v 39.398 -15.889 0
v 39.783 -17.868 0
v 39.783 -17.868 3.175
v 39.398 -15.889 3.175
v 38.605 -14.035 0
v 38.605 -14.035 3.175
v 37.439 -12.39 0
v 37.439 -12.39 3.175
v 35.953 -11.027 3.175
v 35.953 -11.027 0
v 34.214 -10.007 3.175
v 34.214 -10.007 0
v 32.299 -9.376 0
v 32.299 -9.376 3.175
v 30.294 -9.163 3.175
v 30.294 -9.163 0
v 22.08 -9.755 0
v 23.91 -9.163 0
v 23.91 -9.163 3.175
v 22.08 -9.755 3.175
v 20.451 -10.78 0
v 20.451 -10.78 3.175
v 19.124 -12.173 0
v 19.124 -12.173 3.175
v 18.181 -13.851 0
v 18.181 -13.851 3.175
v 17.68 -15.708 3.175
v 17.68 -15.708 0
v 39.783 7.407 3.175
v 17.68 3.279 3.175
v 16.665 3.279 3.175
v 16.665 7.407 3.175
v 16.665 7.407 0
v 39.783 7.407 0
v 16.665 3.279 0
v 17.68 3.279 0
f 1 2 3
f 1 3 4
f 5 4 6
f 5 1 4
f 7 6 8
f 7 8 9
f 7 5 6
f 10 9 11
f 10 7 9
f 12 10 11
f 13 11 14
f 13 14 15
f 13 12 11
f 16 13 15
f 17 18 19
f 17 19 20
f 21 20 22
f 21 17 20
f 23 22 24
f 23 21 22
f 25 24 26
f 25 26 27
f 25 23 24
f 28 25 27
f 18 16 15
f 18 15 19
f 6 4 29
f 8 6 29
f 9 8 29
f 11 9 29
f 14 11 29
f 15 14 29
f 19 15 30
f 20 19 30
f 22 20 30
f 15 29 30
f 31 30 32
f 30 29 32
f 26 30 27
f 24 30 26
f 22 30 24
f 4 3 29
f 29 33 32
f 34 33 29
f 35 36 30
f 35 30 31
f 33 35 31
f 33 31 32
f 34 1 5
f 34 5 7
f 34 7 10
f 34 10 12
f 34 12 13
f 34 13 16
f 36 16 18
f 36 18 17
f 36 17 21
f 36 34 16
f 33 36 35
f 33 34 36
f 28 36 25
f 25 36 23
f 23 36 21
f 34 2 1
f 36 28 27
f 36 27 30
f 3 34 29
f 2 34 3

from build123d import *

# Parameters (mm, degrees)
BOSS_EXTRUDE3_DEPTH = 3.175


with BuildPart() as part:
    # Sketch3 → Boss-Extrude3 (new body)
    with BuildSketch(Plane.XY):
        with BuildLine():
            Line((30.293540828, -9.162699553), (26.82456956, -9.162699553))
            Line((26.82456956, -9.162699553), (23.910273162, -9.162699553))
            ThreePointArc((23.910273162, -9.162699553), (19.744450184, -11.435363695), (17.679624466, -15.708018391))
            Line((17.679624466, -15.708018391), (17.679624466, 3.279335675))
            Line((17.679624466, 3.279335675), (16.66456956, 3.279335675))
            Line((16.66456956, 3.279335675), (16.66456956, 7.406835675))
            Line((16.66456956, 7.406835675), (38.515978397, 7.406835675))
            Line((38.515978397, 7.406835675), (39.783204201, 7.406835675))
            Line((39.783204201, 7.406835675), (39.783204201, -6.622699553))
            Line((39.783204201, -6.622699553), (39.783204201, -9.162699553))
            Line((39.783204201, -9.162699553), (39.783204201, -17.86799591))
            ThreePointArc((39.783204201, -17.86799591), (36.732405161, -11.668678888), (30.293540828, -9.162699553))
        make_face()
    extrude(amount=BOSS_EXTRUDE3_DEPTH)


solid = part.part
